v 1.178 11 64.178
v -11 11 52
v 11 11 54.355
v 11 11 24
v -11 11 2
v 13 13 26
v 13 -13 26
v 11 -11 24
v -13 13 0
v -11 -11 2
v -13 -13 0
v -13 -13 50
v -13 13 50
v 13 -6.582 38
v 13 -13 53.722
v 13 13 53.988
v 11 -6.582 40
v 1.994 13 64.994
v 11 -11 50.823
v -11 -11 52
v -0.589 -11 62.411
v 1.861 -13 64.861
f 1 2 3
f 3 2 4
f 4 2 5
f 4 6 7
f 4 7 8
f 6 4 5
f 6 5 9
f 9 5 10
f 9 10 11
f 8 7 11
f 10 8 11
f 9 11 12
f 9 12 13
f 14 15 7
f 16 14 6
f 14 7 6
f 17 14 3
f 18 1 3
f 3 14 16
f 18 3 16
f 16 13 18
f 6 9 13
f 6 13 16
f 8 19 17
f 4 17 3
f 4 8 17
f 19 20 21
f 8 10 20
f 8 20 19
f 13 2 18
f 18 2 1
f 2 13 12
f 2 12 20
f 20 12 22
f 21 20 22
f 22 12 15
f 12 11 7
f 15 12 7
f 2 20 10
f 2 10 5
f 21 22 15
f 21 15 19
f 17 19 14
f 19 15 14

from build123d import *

# Parameters (mm, degrees)
F0_W      = 26
F0_H      = 26
F0_W_2    = 22
F0_H_2    = 22
F1_DEPTH  = 75
F5_DEPTH  = 26.001
F9_DEPTH  = 44.548727
F11_DEPTH = 26.001


with BuildPart() as f1:
    # F0 (on Top) → F1 (new body)
    with BuildSketch(Plane.XY):
        Rectangle(F0_W, F0_H)
        Rectangle(F0_W_2, F0_H_2, mode=Mode.SUBTRACT)
    extrude(amount=F1_DEPTH)

    # F2 (on face) → F5 (cut, through all)
    with BuildSketch(Plane.XZ.offset(13)):
        Polygon((13, 26), (-13, 0), (13, 0), align=None)
    extrude(amount=-F5_DEPTH, mode=Mode.SUBTRACT)

    # F8 (on face) → F9 (cut, through all)
    with BuildSketch(Plane(origin=(-12.5, 0, 12.5), x_dir=(0, 1, 0), z_dir=(0.707107, 0, -0.707107))):
        Polygon((-13, 47.179355), (-6.58165, 36.062446), (13, 47.367917), (13, 69.708109), (-13, 69.708109), align=None)
    extrude(amount=-F9_DEPTH, mode=Mode.SUBTRACT)

    # F10 (on face) → F11 (cut, through all)
    with BuildSketch(Plane.XZ.offset(13)):
        Polygon((-13, 87.199546), (-13, 50), (20.817262, 83.817262), (20.817262, 87.199546), align=None)
    extrude(amount=-F11_DEPTH, mode=Mode.SUBTRACT)


solid = f1.part
